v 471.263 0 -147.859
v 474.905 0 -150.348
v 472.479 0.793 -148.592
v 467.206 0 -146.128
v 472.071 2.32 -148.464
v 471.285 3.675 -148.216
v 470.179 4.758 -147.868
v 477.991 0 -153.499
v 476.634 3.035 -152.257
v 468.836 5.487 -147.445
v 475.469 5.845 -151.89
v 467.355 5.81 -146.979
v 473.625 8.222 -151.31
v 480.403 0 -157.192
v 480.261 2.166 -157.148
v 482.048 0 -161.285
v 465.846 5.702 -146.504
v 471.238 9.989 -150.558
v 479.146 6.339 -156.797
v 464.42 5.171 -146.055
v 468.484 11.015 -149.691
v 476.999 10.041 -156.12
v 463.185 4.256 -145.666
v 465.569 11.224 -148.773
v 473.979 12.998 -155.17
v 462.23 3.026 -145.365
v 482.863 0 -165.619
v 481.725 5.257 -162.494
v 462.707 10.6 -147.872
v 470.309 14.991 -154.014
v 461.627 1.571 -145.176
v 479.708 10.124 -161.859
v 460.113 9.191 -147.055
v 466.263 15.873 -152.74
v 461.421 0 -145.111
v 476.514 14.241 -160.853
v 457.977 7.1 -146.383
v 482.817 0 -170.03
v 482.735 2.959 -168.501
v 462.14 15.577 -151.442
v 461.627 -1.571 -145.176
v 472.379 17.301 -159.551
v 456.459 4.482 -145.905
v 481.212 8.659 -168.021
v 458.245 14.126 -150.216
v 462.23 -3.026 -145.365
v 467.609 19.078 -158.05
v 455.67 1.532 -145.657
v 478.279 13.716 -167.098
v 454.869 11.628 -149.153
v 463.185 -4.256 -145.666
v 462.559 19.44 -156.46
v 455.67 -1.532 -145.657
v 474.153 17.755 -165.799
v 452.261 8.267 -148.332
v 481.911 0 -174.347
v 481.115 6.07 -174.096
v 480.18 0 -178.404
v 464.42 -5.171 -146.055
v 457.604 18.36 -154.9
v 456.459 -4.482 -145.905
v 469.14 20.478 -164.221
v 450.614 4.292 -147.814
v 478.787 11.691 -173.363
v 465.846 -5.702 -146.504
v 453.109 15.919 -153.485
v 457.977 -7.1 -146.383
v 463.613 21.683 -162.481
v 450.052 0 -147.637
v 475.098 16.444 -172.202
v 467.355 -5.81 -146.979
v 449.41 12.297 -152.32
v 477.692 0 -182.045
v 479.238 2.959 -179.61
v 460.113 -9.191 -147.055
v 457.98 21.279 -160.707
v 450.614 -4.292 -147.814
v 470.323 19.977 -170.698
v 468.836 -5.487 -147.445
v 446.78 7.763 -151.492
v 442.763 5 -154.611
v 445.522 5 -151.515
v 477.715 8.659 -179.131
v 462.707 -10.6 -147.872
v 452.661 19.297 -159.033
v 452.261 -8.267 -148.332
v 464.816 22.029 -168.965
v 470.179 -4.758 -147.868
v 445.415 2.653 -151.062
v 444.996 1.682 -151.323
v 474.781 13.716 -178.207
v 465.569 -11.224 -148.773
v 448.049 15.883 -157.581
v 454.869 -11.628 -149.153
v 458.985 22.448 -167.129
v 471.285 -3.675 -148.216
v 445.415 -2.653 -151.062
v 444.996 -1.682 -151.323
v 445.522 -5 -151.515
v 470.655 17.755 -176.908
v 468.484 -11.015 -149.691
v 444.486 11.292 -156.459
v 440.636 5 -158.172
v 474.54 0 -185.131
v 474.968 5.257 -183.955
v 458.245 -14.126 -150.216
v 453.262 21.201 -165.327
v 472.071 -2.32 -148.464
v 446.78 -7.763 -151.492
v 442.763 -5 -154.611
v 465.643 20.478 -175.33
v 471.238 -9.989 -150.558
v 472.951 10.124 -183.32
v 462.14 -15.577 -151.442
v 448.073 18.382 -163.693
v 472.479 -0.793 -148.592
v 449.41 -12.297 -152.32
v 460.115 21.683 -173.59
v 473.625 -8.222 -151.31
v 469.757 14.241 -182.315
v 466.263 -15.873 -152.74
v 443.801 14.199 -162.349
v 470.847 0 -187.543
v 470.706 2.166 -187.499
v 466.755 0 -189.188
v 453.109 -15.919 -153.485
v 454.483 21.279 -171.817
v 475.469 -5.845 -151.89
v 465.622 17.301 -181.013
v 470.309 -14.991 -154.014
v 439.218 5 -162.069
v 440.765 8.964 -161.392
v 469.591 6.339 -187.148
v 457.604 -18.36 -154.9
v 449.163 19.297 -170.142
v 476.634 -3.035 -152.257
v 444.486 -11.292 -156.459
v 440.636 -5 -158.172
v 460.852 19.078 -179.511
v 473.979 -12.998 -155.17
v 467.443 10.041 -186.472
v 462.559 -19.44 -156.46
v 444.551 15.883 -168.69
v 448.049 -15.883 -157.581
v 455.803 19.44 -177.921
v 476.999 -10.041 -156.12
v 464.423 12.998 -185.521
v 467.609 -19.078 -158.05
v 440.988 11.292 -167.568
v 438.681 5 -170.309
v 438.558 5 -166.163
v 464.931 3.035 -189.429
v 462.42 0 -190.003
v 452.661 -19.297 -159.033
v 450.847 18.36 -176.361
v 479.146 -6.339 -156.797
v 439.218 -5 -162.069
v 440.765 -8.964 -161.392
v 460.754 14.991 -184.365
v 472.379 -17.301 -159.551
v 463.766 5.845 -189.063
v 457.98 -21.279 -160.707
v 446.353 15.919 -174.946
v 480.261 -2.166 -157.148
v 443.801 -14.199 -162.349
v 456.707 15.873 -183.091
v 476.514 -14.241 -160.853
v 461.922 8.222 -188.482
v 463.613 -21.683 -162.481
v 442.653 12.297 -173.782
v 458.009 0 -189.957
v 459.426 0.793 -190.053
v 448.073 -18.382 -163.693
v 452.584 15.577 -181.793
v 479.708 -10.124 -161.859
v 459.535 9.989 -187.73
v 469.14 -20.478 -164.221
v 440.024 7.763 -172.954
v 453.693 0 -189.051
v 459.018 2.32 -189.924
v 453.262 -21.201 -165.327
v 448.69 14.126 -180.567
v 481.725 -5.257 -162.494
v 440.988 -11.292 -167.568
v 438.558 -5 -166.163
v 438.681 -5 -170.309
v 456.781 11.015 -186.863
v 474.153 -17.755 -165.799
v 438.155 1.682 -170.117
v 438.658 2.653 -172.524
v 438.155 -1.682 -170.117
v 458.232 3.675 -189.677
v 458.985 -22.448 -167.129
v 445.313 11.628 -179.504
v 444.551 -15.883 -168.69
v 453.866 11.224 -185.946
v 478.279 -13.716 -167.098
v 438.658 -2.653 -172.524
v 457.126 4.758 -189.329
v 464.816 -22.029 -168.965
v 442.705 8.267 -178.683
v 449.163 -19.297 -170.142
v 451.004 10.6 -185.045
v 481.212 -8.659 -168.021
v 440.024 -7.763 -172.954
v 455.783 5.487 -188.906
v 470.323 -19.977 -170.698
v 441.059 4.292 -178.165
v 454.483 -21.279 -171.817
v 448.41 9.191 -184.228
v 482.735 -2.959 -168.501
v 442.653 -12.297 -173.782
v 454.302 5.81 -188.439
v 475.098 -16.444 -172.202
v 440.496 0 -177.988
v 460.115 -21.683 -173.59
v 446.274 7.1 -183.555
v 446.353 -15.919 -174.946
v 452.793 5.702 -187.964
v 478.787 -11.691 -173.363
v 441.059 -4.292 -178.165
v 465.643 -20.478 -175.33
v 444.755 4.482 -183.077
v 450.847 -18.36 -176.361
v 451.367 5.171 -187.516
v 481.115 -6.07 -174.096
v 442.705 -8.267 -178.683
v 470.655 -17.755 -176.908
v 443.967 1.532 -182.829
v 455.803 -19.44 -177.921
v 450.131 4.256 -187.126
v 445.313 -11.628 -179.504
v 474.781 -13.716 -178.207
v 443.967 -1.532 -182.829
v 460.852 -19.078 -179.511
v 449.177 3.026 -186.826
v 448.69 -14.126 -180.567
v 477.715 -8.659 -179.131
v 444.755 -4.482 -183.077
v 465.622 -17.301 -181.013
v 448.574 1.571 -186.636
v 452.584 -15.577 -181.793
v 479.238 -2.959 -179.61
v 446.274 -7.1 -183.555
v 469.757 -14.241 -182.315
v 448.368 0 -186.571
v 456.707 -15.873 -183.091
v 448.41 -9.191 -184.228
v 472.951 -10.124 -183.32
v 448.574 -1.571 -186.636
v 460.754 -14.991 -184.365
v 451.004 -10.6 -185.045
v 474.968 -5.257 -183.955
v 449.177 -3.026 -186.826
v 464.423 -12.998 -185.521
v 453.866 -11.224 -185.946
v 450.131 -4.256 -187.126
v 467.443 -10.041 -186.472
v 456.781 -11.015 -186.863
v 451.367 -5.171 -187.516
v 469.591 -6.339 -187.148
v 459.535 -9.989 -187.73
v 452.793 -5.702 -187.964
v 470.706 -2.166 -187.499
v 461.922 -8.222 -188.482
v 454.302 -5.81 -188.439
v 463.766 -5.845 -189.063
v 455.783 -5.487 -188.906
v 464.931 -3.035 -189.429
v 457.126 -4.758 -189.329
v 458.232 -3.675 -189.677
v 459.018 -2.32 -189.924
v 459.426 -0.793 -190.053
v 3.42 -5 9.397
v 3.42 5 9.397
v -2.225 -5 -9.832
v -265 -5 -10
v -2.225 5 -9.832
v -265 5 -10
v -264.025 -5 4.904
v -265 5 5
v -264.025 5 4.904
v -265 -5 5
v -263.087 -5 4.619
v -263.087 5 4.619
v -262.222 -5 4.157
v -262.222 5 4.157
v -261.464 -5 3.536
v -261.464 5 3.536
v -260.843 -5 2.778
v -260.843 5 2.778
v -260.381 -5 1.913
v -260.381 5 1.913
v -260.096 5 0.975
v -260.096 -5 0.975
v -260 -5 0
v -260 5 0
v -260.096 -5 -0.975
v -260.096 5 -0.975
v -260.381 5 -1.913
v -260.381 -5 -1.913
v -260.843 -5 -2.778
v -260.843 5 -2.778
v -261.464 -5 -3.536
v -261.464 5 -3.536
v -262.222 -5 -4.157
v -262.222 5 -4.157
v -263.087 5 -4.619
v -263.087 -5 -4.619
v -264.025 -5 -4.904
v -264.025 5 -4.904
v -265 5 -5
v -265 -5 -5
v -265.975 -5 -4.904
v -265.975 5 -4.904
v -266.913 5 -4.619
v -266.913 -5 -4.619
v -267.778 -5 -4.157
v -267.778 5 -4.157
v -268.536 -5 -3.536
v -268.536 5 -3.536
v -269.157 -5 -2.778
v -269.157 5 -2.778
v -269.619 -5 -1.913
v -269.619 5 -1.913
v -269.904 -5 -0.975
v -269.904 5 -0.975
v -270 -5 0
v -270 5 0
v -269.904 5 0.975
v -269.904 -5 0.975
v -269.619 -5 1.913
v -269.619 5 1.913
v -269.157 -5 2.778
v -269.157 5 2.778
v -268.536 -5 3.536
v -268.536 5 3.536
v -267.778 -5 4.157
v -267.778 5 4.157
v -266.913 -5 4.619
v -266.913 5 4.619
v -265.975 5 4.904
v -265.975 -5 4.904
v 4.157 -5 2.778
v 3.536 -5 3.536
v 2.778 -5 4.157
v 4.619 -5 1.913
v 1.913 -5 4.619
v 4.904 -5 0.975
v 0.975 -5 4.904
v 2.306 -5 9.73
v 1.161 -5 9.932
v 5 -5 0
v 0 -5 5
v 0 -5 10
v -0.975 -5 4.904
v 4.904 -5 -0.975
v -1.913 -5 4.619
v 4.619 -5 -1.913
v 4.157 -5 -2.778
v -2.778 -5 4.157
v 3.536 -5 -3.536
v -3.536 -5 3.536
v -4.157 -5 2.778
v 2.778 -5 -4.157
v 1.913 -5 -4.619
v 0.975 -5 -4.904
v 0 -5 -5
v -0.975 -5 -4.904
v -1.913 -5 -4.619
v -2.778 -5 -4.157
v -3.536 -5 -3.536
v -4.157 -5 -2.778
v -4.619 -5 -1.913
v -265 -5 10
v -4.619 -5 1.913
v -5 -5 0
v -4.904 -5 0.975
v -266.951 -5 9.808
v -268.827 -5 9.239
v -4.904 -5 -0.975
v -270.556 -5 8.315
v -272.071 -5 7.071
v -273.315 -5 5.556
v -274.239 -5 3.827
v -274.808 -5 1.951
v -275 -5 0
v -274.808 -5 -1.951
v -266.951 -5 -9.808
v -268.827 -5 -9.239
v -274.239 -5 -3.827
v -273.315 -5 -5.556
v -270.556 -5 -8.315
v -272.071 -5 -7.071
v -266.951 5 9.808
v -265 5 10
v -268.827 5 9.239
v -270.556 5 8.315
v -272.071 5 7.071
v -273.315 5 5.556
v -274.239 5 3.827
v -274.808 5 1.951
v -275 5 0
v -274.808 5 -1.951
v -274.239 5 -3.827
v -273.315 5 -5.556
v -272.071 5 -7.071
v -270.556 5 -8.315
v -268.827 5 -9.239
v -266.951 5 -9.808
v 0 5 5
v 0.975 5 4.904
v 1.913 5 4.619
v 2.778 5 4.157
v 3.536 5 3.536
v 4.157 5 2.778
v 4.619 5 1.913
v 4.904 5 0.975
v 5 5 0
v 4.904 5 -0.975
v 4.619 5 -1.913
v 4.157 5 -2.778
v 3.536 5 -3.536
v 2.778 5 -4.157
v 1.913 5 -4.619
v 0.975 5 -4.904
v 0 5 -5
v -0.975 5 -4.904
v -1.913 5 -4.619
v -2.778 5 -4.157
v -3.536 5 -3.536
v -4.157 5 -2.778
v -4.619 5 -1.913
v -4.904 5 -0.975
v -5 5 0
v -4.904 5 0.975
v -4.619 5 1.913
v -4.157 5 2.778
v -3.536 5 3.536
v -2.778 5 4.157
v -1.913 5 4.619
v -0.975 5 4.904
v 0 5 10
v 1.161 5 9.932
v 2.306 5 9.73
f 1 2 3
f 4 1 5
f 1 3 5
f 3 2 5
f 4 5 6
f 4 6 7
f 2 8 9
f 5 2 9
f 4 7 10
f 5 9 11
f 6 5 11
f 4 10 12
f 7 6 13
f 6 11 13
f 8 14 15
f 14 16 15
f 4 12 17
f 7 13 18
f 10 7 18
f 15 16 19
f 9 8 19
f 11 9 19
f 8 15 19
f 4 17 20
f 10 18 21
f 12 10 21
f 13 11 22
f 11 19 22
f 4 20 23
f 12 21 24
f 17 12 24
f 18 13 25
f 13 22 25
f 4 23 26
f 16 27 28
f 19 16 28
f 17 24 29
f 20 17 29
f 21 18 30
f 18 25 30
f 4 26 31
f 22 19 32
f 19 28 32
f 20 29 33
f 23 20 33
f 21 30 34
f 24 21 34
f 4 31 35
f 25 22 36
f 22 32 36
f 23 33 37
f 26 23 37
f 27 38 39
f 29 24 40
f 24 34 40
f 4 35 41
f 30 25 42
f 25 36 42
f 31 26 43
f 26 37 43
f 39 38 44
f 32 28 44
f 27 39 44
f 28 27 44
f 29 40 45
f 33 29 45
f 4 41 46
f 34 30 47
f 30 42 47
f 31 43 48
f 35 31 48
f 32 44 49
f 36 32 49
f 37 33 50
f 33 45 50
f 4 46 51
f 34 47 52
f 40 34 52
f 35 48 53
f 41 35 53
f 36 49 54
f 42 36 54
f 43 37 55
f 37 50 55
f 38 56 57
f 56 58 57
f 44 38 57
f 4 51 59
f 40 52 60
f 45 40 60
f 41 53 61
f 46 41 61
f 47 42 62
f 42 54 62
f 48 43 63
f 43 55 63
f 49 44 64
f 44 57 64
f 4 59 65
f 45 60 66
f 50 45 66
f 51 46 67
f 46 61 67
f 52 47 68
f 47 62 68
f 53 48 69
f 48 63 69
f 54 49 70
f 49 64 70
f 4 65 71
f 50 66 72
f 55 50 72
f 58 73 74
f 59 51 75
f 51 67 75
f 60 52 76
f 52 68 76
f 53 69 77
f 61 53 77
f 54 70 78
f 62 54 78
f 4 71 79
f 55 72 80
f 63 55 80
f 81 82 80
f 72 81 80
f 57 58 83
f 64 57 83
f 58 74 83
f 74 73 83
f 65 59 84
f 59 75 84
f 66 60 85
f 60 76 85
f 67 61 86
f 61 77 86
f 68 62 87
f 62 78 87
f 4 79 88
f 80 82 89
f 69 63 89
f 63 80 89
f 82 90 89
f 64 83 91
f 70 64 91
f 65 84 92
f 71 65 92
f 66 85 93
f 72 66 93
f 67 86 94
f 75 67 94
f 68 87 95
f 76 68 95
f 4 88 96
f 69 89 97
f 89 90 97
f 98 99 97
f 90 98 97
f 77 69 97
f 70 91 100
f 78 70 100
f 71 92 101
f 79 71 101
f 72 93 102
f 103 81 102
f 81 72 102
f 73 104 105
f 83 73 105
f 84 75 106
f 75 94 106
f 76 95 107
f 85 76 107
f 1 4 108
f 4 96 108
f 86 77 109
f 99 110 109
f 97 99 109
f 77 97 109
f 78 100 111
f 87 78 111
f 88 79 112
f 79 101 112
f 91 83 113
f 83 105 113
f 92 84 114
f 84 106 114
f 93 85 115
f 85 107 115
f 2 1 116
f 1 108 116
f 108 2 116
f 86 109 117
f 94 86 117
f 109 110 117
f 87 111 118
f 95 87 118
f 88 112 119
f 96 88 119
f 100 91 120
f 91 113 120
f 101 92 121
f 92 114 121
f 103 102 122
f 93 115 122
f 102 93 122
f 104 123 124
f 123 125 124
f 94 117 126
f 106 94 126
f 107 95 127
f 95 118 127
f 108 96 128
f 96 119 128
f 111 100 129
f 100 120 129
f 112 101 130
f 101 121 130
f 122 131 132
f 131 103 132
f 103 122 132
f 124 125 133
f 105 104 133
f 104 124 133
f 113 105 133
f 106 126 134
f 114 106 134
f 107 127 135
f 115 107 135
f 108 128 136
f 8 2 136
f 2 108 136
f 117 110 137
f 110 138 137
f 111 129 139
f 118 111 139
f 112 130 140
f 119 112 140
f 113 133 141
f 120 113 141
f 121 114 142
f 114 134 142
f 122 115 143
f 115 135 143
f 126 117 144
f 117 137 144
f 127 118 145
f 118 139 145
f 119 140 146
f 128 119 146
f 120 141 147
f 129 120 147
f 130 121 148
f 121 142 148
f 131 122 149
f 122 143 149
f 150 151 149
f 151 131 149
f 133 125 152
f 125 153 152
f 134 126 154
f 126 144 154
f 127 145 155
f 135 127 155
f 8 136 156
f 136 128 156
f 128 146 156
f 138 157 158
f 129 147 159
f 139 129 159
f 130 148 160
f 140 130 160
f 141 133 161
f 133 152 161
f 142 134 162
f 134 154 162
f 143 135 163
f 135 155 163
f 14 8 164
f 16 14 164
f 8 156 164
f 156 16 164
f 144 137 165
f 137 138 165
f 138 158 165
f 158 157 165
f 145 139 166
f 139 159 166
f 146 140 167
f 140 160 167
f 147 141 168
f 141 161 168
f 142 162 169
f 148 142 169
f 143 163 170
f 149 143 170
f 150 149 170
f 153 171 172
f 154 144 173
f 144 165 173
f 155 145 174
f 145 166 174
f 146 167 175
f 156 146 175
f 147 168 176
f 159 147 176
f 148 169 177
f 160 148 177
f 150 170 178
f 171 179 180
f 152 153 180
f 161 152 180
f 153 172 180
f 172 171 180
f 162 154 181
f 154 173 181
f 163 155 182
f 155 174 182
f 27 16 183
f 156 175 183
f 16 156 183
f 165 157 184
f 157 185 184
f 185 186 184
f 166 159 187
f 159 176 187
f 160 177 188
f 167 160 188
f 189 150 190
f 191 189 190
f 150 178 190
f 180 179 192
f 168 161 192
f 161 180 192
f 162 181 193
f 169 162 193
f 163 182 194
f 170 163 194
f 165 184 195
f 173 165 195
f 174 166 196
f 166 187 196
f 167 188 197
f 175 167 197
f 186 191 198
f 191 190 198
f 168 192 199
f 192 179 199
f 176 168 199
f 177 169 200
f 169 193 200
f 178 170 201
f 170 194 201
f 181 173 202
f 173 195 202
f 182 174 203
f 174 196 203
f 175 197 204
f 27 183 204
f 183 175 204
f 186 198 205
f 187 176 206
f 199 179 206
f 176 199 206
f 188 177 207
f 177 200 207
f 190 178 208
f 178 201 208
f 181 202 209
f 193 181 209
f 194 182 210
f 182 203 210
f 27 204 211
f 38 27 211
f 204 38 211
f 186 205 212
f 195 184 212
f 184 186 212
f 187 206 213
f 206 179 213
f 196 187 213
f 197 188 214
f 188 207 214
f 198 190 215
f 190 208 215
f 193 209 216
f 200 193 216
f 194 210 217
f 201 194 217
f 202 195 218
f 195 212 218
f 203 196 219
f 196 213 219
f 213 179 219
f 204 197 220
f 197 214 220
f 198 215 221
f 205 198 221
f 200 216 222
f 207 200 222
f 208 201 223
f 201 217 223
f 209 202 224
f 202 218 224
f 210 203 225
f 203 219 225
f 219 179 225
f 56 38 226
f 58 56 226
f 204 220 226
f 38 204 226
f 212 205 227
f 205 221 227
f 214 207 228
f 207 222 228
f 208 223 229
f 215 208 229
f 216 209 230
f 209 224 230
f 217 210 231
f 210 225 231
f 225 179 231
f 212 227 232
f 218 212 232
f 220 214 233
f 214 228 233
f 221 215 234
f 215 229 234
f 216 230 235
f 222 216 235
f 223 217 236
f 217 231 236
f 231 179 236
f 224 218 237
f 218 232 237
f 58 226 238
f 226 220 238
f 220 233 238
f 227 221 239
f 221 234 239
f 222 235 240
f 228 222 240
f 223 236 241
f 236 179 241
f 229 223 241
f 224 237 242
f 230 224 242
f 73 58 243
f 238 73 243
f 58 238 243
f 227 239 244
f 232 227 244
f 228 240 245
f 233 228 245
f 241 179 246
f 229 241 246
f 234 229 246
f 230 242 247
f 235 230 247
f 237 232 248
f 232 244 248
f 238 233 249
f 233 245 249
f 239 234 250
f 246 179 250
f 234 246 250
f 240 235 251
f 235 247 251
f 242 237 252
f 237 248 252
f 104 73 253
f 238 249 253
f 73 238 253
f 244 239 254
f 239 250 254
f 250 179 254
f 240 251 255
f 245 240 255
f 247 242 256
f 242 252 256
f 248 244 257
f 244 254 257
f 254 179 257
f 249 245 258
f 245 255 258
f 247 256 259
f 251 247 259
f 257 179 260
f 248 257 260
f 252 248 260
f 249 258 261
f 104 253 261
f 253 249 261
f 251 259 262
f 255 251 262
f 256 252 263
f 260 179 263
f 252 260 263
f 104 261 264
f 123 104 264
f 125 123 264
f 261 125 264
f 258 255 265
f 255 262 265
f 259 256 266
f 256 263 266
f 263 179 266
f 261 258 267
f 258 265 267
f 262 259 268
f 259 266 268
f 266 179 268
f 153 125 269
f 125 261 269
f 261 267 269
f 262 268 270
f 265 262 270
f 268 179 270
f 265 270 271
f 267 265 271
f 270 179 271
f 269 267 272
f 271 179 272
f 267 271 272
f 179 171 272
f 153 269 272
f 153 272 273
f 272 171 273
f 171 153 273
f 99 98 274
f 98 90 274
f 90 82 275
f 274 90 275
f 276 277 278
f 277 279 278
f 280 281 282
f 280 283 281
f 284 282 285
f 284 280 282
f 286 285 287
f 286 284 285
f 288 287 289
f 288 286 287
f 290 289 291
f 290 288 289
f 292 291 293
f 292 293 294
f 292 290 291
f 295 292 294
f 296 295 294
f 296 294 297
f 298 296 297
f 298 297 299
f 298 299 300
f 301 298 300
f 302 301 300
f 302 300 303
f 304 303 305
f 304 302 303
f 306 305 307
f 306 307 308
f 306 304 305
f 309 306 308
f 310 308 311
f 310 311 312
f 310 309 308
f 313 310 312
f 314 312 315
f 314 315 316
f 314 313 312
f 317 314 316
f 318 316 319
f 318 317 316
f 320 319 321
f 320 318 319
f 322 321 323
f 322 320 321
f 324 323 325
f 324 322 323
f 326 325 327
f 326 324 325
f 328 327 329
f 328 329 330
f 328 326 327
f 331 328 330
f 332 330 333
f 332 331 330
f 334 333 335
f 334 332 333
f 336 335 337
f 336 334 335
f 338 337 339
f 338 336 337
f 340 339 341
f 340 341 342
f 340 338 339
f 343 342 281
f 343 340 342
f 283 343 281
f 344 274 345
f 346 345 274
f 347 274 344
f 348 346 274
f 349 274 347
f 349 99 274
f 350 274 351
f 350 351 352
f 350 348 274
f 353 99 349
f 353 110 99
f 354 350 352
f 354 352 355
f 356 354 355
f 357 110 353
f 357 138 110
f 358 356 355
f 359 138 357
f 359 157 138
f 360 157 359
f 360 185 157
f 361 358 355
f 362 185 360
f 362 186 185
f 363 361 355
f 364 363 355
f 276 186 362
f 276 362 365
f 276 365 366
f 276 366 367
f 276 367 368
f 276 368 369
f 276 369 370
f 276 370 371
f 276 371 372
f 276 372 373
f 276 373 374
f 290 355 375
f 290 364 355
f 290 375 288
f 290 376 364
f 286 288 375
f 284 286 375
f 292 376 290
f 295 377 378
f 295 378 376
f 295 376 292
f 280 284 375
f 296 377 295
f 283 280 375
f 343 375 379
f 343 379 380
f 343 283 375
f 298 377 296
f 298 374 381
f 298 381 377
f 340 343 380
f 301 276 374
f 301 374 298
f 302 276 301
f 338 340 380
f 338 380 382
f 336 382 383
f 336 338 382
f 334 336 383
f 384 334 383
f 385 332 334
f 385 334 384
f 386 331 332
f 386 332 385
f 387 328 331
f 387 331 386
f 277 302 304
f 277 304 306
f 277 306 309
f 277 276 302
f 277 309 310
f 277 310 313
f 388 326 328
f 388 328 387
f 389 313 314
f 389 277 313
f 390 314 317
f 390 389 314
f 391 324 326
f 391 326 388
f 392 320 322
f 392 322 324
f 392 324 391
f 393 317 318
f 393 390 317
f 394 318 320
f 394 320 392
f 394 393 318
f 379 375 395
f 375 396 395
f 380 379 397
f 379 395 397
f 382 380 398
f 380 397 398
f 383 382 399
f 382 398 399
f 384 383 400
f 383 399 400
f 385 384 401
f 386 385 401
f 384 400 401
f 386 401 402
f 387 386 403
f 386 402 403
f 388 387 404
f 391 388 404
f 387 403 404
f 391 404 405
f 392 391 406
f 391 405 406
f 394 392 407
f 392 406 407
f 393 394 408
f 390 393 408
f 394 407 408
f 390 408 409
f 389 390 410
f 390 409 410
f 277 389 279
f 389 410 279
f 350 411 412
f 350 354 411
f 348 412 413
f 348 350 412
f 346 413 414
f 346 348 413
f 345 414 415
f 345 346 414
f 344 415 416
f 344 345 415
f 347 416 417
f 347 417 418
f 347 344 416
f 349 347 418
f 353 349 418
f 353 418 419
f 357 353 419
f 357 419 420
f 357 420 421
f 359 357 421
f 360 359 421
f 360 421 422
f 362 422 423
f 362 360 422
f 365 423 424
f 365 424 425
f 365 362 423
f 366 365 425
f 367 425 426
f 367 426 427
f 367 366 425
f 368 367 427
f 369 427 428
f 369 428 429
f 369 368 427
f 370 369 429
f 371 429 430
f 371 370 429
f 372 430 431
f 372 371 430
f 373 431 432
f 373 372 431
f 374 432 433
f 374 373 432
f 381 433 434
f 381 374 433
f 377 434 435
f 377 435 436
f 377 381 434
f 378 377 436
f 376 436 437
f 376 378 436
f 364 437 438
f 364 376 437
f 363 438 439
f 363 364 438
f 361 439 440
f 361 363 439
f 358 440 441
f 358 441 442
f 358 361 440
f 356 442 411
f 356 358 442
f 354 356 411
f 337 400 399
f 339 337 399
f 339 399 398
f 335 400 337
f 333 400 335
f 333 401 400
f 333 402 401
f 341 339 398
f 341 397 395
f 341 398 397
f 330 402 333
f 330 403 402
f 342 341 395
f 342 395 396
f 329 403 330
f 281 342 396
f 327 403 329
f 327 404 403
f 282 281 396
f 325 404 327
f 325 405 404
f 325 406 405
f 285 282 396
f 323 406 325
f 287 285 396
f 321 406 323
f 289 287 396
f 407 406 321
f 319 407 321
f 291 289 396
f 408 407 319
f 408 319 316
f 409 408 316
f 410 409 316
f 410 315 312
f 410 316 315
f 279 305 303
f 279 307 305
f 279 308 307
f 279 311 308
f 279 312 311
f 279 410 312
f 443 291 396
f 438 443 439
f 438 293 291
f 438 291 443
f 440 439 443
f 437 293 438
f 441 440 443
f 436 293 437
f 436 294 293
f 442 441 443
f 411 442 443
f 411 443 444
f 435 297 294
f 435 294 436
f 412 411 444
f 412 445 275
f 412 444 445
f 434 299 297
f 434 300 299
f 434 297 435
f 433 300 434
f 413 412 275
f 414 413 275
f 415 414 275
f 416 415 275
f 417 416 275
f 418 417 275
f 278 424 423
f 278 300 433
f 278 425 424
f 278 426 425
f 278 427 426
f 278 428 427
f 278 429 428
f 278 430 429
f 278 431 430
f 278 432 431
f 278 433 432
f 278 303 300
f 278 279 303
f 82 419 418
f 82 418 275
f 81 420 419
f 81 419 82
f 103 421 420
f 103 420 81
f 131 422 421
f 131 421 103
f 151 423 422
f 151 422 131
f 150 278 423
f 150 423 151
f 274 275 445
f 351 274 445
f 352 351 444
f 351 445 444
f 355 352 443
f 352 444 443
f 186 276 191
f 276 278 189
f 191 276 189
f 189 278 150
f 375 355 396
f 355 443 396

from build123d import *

# Parameters (mm, degrees)
SKETCH1_R           = 5
BOSS_EXTRUDE1_DEPTH = 5
SKETCH2_R           = 5
BOSS_EXTRUDE2_DEPTH = 5


with BuildPart() as part:
    # Sketch1 → Boss-Extrude1 (new, symmetric)
    with BuildSketch(Plane(origin=(0, 0, 0), x_dir=(1, 0, 0), z_dir=(0, 1, 0))):
        with BuildLine():
            ThreePointArc((3.420201433, -9.396926208), (1.736481777, -9.84807753), (0, -10))
            Line((0, -10), (-265, -10))
            ThreePointArc((-265, -10), (-275, 0), (-265, 10))
            Line((-265, 10), (-2.224544129, 9.832109877))
            Line((-2.224544129, 9.832109877), (457.029182752, 176.986796437))
            ThreePointArc((457.029182752, 176.986796437), (469.846310393, 171.010071663), (463.869585618, 158.192944022))
            Line((463.869585618, 158.192944022), (3.420201433, -9.396926208))
        make_face()
        with Locations(Location((460.449384185, 167.58987023, 0), (0, 0, 270))):
            Circle(SKETCH1_R, mode=Mode.SUBTRACT)
        with Locations(Location((0, 0, 0), (0, 0, 270))):
            Circle(SKETCH1_R, mode=Mode.SUBTRACT)
        with Locations(Location((-265, 0, 0), (0, 0, 270))):
            Circle(SKETCH1_R, mode=Mode.SUBTRACT)
    extrude(amount=BOSS_EXTRUDE1_DEPTH, both=True)

    # Sketch2 → Boss-Extrude2 (add, symmetric)
    with BuildSketch(Plane(origin=(0, 0, 0), x_dir=(1, 0, 0), z_dir=(0, 1, 0))):
        with Locations((460.449384185, 167.58987023)):
            Circle(SKETCH2_R)
    extrude(amount=BOSS_EXTRUDE2_DEPTH, both=True)

    # Sketch3 → Revolve1 (revolve)
    with BuildSketch(Plane(origin=(0, 0, 0), x_dir=(1, 0, 0), z_dir=(0, 1, 0))):
        with BuildLine():
            Line((453.692605533, 189.051369298), (467.206162837, 146.128371161))
            ThreePointArc((467.206162837, 146.128371161), (481.910883253, 174.346648881), (453.692605533, 189.051369298))
        make_face()
    revolve(axis=Axis((453.692605533, 0, -189.051369298), (0.30030127341076346, 0, 0.9538444030280169)))


solid = part.part
